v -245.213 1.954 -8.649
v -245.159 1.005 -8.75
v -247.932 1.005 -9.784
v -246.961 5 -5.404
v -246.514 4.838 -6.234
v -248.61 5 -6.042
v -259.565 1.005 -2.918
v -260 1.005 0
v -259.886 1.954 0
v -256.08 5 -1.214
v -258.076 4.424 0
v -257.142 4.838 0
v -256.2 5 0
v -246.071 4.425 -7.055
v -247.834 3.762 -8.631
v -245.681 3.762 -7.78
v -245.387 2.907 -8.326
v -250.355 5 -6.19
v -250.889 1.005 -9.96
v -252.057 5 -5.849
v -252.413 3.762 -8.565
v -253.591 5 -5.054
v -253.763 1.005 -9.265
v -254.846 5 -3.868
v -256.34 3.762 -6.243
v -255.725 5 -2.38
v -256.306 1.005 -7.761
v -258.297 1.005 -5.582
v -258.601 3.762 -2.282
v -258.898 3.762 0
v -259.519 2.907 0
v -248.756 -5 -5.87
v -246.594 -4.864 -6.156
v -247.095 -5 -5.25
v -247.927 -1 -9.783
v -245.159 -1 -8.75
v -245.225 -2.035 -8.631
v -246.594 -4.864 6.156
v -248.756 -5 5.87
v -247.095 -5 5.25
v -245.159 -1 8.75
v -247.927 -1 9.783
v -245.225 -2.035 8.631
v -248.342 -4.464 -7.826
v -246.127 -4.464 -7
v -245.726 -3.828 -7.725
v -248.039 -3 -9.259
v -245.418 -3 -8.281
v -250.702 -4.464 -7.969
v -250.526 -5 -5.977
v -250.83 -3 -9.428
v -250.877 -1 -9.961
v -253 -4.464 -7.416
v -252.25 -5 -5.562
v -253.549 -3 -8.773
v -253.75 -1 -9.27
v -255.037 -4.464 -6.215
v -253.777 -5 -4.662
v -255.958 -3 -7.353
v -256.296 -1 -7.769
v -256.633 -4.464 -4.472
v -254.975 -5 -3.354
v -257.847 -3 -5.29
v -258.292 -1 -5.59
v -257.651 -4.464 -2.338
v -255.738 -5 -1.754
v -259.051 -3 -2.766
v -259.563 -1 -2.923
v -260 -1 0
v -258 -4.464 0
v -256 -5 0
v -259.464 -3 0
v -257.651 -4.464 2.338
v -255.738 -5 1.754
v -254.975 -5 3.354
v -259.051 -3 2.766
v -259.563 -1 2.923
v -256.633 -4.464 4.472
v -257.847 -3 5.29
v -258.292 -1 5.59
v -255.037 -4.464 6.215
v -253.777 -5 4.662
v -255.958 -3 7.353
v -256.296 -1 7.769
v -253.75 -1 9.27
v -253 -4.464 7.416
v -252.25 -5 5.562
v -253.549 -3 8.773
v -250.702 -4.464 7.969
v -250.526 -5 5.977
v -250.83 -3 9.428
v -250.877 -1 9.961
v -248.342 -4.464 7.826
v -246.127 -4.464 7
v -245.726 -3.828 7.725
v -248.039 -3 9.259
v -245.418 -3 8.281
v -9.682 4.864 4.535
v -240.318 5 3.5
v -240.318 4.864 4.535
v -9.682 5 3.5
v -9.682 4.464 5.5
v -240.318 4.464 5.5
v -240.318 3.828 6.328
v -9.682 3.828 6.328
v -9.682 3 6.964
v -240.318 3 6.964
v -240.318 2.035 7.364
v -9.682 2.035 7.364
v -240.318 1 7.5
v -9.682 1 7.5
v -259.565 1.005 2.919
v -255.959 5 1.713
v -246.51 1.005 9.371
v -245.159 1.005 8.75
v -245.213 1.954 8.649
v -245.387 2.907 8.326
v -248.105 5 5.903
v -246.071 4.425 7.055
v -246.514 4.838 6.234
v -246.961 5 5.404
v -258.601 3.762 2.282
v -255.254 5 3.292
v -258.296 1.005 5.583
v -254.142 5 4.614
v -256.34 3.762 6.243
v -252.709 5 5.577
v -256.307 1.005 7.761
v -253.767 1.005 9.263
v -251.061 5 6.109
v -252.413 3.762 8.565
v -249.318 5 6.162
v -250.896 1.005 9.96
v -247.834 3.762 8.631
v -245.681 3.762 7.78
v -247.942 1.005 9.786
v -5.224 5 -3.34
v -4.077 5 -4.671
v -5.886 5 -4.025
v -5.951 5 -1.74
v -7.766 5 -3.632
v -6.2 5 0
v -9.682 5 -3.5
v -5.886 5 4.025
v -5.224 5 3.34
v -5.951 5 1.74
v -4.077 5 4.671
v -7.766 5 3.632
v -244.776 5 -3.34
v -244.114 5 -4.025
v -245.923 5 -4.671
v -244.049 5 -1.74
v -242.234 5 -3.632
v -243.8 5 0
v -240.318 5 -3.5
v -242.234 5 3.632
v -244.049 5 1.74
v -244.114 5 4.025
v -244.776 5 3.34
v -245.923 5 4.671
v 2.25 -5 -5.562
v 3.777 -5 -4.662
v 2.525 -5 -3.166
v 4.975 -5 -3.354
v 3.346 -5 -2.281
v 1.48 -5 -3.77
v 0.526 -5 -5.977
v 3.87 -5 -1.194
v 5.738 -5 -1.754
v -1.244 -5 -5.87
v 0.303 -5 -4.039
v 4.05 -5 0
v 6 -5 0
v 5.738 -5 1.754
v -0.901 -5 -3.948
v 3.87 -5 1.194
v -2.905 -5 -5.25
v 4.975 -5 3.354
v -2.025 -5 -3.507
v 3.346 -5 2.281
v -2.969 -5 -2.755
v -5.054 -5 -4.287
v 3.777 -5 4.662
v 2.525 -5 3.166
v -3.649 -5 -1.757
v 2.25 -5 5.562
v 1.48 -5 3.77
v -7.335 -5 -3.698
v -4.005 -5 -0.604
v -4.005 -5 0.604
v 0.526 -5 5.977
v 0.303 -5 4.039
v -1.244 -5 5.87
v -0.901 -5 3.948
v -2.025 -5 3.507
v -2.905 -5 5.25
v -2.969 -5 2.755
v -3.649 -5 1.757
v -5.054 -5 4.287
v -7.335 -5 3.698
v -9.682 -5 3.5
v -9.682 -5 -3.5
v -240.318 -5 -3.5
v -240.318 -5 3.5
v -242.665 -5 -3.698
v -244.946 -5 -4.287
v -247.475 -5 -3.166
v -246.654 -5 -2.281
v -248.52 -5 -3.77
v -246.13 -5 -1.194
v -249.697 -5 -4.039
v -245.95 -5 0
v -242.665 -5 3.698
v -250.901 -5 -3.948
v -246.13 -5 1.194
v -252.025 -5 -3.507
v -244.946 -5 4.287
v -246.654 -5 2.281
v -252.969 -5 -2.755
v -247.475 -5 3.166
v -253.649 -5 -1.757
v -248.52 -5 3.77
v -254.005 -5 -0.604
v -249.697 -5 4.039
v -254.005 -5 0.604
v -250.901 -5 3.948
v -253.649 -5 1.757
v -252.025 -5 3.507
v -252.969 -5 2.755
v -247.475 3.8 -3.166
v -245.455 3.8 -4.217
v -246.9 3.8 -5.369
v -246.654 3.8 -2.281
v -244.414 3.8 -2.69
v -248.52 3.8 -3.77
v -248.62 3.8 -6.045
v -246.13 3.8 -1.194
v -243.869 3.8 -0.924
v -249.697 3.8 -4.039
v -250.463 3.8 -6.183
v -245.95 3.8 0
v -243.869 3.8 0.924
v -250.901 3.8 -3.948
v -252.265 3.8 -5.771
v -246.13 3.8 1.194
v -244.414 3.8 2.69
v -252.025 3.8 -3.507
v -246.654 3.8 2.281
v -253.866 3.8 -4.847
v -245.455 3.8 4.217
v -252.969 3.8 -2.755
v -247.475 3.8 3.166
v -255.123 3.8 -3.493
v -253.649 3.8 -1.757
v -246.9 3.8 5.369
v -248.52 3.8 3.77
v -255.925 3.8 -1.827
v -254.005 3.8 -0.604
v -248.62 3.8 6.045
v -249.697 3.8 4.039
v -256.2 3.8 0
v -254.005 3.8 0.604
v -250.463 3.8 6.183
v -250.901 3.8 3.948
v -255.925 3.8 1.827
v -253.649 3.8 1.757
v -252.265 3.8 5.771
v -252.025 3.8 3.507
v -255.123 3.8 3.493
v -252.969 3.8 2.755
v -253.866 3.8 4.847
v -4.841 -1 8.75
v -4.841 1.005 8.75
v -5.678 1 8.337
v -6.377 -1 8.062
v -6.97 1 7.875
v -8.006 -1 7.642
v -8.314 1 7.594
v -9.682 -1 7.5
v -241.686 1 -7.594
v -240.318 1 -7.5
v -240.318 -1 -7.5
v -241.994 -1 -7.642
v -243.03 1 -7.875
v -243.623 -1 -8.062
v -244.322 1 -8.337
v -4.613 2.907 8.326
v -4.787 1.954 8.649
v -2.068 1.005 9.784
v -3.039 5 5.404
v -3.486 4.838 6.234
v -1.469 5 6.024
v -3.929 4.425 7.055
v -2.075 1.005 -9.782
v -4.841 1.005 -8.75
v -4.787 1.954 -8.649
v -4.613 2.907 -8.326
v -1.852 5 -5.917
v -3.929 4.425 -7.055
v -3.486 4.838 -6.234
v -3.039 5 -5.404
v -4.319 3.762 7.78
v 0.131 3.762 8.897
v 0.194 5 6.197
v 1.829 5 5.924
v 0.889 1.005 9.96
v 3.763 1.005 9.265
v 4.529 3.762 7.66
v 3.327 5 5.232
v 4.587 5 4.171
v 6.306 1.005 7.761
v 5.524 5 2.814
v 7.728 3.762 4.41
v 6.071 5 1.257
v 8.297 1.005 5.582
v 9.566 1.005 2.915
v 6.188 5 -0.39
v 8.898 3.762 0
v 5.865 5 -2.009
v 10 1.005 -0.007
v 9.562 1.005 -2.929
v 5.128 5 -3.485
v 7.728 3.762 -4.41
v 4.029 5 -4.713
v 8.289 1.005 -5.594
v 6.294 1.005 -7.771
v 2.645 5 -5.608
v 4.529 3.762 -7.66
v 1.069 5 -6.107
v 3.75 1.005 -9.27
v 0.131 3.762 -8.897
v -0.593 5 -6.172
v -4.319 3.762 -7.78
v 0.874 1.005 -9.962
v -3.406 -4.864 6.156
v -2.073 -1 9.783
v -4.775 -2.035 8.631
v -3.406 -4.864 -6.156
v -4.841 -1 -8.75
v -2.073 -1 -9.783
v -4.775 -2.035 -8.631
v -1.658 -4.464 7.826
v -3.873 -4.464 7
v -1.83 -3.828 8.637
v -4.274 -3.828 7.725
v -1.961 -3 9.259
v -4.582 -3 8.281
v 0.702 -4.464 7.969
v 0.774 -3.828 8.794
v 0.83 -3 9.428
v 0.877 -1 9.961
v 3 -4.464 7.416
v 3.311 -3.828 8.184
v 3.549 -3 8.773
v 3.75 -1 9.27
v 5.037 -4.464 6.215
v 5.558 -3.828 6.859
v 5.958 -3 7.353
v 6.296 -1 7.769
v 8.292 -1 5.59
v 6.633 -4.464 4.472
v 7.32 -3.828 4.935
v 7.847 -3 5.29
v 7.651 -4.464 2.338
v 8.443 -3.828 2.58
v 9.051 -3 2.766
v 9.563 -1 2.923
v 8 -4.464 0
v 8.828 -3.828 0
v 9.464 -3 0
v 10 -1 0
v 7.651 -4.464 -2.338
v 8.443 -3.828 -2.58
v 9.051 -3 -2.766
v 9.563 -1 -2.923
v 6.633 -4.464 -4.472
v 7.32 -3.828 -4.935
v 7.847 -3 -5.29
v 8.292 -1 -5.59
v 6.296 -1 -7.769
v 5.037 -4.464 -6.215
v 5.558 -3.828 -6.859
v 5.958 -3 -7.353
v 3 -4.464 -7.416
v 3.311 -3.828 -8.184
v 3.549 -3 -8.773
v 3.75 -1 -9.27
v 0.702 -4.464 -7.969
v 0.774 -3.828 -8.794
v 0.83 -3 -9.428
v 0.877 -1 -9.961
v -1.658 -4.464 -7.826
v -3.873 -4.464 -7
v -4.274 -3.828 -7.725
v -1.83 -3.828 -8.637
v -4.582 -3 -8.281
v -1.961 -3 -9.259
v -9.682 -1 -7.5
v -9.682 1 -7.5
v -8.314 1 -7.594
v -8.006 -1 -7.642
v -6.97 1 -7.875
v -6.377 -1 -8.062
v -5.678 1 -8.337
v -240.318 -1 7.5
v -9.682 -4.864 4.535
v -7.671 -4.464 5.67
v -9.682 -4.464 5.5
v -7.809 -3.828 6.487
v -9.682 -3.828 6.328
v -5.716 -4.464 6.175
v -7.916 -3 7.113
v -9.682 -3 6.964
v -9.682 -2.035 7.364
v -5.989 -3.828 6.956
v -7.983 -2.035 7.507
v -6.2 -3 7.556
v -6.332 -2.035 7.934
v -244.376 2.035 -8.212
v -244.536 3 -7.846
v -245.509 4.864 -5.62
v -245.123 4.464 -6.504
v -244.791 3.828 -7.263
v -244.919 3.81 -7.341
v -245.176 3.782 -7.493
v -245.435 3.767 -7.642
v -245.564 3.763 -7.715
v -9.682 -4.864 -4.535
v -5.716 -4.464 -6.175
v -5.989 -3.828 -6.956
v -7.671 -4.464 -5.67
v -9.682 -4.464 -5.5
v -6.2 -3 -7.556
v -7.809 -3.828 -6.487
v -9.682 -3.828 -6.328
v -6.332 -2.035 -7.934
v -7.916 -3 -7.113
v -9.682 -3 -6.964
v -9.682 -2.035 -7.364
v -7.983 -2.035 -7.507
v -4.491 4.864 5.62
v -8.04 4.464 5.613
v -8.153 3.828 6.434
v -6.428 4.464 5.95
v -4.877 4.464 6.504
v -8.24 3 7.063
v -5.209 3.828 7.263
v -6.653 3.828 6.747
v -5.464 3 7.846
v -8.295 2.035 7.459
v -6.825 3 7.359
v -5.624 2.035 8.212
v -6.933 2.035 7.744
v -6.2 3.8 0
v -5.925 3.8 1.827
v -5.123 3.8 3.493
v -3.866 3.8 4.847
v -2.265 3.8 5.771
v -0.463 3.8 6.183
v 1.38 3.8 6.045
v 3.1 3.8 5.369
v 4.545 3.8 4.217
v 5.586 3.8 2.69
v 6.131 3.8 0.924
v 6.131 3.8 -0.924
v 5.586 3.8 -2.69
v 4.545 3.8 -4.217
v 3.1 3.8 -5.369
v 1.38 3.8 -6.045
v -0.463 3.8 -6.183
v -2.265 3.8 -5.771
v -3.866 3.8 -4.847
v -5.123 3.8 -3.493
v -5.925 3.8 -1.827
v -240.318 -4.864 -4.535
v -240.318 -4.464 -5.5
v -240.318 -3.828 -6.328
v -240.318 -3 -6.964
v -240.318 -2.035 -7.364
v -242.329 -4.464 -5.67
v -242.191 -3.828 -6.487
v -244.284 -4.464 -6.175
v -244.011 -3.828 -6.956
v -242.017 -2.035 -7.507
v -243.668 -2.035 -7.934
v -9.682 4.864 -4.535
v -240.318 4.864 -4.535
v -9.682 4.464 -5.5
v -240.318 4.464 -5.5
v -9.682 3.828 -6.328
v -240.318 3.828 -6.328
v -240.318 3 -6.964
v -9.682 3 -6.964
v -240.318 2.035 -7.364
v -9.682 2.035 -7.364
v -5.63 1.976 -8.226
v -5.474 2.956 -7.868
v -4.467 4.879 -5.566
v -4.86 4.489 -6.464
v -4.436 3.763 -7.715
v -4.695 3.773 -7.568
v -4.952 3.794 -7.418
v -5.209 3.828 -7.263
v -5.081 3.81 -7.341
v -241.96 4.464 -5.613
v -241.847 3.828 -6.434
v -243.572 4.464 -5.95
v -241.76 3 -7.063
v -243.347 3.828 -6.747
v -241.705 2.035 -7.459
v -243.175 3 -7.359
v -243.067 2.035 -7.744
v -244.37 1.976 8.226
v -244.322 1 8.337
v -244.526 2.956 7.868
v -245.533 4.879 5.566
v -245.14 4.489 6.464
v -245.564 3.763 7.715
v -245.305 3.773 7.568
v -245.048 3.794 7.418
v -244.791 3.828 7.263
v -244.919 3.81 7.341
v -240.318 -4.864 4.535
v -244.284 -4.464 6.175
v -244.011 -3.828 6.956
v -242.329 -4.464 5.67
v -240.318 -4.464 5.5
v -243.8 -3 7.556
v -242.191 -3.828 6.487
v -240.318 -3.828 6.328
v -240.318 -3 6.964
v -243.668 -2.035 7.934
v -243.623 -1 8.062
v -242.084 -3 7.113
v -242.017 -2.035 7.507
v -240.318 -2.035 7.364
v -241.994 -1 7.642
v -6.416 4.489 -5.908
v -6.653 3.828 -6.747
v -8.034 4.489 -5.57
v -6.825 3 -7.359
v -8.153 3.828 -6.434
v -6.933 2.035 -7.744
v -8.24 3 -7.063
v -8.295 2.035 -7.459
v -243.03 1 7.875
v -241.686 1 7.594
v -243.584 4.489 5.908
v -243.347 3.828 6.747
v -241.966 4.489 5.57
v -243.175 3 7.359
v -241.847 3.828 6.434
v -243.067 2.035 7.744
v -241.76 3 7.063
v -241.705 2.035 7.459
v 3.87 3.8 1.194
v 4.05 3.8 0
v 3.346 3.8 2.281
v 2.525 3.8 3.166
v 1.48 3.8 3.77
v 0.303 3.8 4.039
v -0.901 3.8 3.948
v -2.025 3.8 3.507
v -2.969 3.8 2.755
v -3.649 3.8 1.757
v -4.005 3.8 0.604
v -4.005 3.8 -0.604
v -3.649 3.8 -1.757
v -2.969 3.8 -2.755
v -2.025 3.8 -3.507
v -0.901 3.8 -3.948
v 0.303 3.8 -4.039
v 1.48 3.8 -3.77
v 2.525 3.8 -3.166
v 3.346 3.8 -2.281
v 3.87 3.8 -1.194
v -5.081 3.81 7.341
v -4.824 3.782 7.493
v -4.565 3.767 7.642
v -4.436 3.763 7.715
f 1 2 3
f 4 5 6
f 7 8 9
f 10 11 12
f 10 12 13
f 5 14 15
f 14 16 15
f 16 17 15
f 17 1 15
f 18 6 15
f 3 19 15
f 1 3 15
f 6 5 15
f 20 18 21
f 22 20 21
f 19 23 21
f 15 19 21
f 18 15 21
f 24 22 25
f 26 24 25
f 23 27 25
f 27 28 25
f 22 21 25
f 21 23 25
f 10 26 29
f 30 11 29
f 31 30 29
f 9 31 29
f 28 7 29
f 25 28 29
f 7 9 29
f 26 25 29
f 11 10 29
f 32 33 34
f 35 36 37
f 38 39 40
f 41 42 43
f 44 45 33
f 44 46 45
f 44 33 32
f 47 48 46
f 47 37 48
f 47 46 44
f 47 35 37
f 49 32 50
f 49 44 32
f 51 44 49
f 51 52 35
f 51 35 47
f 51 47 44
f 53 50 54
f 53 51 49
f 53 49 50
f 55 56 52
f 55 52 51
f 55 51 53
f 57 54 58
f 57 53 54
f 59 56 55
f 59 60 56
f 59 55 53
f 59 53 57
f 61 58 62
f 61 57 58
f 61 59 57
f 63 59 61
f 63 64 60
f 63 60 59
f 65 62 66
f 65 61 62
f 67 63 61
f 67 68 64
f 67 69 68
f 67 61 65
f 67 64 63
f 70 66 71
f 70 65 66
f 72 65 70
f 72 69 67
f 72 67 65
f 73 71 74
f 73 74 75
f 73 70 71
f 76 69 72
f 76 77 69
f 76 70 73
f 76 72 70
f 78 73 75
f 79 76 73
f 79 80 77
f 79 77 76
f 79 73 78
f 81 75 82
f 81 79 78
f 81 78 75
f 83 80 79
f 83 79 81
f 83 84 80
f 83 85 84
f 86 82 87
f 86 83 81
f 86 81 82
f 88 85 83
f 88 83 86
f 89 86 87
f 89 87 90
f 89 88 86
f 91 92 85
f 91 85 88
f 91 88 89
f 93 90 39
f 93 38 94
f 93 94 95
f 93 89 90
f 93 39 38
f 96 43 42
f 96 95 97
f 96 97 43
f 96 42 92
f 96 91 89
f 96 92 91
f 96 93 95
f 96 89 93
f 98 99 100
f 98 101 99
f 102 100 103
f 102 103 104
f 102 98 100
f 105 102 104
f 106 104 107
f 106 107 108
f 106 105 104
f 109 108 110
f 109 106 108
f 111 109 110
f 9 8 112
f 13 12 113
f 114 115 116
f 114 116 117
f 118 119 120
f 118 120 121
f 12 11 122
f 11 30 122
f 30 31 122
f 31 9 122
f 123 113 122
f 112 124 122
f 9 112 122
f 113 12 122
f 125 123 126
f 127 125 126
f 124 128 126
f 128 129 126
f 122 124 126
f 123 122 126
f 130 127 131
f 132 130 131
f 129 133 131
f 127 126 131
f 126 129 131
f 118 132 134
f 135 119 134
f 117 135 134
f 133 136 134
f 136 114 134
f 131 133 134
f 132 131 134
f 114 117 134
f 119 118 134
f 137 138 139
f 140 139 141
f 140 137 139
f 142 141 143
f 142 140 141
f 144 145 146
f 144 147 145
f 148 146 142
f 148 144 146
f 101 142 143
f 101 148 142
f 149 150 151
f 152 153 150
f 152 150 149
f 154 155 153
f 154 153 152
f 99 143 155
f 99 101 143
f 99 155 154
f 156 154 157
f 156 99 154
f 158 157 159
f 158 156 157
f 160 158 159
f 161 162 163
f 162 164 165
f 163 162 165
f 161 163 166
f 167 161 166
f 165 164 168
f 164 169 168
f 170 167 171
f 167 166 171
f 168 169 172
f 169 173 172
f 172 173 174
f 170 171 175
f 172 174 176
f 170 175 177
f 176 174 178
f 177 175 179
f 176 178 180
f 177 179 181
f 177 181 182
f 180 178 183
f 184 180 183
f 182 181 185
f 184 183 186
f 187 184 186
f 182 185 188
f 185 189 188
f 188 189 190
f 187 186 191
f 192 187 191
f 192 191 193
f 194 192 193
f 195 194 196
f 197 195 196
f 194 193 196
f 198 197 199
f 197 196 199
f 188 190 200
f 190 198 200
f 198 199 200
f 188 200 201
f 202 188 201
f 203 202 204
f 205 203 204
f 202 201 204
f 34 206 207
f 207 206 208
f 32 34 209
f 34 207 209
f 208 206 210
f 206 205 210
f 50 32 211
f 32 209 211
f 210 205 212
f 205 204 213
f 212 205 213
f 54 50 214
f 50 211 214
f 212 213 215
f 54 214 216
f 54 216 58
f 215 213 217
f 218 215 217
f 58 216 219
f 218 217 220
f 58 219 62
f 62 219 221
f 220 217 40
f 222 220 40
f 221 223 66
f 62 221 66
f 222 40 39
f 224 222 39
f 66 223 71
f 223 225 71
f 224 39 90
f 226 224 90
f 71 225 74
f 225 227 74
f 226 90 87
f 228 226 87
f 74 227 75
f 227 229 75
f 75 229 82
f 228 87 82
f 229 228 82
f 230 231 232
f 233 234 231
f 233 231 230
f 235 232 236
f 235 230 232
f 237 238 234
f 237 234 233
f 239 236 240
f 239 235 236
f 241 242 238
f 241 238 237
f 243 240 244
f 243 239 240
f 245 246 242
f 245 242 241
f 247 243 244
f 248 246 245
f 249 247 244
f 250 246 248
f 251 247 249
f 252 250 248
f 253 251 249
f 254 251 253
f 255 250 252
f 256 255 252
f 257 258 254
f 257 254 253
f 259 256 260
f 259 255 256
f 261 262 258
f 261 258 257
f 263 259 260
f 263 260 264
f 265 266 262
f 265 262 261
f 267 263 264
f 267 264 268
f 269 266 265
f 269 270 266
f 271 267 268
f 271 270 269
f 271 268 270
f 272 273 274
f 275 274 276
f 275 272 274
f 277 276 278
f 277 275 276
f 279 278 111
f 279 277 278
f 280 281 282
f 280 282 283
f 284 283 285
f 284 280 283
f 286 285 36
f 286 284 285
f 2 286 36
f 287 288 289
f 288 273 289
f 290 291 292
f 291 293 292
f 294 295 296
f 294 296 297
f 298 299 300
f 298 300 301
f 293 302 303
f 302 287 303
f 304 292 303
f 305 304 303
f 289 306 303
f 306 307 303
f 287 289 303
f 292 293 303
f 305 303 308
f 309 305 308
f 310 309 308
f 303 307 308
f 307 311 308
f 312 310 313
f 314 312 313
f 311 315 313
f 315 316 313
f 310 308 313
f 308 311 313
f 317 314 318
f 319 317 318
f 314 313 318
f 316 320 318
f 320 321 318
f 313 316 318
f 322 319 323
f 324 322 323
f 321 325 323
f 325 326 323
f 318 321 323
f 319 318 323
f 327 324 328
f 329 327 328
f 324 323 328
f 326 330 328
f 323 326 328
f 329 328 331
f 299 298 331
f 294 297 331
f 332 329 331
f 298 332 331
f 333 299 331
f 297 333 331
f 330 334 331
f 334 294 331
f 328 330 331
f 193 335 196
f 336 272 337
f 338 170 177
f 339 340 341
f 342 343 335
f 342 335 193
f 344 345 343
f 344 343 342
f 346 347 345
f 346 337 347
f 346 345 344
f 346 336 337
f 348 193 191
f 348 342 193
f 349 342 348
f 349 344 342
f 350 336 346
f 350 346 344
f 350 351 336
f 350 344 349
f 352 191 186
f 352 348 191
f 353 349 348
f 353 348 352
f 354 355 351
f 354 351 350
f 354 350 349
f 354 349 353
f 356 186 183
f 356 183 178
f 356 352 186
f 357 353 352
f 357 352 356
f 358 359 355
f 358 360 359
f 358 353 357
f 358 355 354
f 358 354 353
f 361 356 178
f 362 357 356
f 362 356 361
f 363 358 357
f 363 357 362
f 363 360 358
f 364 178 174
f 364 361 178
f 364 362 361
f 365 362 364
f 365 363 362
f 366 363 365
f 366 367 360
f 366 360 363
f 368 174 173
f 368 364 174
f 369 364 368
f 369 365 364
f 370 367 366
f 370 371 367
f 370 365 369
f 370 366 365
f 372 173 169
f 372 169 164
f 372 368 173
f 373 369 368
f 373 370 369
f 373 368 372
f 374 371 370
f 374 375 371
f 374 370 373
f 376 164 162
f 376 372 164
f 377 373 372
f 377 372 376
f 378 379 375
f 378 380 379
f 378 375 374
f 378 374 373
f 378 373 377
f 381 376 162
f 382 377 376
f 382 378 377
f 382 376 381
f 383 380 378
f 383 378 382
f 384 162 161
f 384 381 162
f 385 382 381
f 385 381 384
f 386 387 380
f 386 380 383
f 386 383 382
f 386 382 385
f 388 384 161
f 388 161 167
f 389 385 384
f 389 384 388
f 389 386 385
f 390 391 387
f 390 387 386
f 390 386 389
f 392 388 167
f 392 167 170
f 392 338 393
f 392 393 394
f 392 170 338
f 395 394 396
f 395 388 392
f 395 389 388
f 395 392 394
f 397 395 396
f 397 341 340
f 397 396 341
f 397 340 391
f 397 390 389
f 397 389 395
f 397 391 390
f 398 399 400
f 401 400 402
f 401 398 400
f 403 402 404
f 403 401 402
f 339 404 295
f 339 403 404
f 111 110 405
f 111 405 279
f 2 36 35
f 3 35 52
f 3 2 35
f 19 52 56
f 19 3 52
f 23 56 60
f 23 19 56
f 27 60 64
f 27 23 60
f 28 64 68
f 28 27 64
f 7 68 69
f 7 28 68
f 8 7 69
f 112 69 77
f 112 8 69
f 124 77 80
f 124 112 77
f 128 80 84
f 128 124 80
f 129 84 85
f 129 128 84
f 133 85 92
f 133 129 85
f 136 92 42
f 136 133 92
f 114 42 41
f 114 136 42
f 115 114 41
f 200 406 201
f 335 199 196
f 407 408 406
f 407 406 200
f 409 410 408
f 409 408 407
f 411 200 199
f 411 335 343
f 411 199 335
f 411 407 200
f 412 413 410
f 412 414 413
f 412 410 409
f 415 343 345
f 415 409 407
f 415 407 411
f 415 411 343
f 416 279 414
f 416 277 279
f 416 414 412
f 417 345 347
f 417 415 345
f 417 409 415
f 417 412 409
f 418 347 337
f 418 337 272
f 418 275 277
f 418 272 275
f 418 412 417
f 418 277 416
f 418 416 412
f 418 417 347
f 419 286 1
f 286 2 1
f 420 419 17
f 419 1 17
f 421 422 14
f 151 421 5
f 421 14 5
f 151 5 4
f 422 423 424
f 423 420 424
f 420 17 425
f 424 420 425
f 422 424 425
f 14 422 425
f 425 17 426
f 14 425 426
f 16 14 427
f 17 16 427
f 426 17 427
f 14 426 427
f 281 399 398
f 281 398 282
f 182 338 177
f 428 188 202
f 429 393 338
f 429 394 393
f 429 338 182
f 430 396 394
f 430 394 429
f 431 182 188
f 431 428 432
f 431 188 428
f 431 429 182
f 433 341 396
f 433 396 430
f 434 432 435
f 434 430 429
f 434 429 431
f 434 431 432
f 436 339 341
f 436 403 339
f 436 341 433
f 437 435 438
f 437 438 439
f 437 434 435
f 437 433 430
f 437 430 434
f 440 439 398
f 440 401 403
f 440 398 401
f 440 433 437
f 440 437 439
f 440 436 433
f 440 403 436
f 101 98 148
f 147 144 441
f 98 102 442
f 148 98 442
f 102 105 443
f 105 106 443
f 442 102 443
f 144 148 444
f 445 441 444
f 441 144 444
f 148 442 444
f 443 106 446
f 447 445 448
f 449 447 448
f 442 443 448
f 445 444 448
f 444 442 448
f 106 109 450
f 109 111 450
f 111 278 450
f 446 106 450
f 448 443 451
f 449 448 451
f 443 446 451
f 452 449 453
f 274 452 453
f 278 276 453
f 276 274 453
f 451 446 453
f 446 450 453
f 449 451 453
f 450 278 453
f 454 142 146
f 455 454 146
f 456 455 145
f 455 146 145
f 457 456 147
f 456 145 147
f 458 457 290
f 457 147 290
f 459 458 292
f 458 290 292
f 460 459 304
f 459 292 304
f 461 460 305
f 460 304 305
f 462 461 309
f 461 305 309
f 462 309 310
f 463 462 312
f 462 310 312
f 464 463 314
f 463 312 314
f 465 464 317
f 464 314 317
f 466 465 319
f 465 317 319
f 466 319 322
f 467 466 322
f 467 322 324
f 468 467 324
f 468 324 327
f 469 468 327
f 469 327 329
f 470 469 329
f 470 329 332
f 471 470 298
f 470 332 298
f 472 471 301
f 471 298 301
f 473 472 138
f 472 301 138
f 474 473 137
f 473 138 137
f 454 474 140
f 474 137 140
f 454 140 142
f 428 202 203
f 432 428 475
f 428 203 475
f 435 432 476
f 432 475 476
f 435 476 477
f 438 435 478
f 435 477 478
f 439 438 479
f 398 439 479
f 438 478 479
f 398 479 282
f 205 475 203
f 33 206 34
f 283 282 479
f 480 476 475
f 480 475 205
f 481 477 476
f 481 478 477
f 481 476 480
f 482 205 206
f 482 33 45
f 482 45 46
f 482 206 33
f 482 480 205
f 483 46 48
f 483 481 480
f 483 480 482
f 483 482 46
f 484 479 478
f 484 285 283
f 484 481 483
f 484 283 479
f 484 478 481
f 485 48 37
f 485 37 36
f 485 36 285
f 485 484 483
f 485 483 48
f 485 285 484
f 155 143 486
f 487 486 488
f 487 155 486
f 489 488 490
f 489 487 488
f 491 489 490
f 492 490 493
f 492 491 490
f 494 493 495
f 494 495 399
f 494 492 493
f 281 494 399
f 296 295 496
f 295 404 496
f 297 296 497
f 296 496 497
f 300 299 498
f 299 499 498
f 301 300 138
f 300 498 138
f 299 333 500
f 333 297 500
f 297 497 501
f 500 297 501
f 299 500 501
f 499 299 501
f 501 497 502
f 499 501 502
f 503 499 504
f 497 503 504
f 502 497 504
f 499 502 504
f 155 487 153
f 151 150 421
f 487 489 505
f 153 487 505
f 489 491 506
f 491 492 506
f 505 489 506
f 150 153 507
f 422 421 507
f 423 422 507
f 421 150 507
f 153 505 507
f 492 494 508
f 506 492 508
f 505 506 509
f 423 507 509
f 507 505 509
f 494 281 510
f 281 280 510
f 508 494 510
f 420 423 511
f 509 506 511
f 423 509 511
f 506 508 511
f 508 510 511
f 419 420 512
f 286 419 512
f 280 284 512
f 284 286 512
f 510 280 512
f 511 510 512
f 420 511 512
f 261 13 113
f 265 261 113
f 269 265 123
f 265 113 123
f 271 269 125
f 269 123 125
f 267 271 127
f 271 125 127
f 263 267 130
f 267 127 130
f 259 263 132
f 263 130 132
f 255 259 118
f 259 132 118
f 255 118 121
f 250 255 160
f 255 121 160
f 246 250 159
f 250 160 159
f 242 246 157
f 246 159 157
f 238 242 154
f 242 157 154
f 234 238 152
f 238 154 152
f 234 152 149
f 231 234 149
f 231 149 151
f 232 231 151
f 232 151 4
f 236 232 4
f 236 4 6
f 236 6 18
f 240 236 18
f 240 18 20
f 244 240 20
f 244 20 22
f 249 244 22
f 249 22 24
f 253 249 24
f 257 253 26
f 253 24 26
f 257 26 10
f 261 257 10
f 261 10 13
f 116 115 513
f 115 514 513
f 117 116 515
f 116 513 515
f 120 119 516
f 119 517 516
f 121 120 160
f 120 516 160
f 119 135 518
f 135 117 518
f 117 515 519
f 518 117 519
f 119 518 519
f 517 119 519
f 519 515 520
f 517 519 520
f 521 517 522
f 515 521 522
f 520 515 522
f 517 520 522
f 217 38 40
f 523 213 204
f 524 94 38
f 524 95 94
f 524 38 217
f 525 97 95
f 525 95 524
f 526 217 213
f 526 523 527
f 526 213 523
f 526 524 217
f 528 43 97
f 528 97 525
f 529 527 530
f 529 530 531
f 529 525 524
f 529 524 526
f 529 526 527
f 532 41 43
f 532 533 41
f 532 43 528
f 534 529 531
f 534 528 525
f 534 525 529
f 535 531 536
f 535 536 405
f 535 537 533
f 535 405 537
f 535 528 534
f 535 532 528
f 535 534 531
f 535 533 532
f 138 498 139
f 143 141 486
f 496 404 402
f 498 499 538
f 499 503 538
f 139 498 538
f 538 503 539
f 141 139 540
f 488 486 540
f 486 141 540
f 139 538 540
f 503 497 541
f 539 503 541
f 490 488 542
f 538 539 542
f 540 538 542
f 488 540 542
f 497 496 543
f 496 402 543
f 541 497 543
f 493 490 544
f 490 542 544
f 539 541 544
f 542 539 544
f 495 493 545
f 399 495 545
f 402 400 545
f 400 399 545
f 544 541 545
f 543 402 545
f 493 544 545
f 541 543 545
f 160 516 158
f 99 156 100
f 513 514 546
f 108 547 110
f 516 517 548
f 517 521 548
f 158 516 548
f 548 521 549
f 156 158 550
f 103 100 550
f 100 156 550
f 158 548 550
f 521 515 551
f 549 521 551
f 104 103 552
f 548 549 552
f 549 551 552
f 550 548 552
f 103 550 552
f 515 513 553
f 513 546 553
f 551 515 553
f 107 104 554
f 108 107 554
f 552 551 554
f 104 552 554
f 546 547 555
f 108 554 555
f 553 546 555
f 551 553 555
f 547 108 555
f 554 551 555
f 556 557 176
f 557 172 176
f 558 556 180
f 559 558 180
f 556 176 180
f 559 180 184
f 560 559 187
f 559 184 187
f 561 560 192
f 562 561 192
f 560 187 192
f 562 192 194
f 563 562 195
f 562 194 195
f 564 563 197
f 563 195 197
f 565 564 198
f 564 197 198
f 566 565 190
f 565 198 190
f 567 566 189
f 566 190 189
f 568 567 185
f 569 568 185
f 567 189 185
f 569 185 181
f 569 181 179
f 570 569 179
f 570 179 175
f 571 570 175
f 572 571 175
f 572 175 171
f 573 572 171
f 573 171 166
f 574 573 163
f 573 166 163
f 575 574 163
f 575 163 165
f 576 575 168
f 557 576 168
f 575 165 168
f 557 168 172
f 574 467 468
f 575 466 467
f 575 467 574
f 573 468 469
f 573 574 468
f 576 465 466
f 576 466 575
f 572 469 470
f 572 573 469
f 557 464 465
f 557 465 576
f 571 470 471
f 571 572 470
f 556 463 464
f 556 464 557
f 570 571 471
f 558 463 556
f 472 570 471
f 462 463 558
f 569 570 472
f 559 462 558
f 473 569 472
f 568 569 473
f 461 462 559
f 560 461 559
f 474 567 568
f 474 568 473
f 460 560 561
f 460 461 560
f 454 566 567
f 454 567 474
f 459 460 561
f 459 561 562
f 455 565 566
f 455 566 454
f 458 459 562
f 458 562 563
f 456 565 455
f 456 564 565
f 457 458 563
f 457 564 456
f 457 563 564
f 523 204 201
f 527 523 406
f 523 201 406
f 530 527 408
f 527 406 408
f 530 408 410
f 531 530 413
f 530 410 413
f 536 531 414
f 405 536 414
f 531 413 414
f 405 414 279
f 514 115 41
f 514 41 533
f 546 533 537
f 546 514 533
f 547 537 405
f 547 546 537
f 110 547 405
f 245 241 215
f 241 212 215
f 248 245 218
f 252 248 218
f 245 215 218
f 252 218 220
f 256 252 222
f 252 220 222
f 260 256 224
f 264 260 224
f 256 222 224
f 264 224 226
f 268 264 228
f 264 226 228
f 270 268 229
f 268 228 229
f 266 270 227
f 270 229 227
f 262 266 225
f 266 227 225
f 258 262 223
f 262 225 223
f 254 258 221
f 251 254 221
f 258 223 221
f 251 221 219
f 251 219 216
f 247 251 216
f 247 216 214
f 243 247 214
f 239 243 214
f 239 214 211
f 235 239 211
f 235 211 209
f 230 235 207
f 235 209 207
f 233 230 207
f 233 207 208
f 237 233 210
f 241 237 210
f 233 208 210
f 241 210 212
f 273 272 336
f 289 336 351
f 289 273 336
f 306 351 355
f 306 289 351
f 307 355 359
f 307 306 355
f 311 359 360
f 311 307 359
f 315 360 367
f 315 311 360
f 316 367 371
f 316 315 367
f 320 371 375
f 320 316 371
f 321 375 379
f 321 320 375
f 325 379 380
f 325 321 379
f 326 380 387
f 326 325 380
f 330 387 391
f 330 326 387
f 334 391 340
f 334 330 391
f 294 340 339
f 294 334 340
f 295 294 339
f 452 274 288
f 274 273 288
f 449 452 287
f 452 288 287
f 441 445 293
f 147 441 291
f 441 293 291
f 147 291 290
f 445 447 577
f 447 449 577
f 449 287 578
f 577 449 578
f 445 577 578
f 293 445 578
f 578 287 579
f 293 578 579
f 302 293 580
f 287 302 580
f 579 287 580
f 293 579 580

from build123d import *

# Parameters (mm, degrees)
SALIENTE_EXTRUIR1_DEPTH                              = 5
REFRENTADO_PARA_TORNILLO_CON_CABEZA_PLAN_D           = 8.1
REFRENTADO_PARA_TORNILLO_CON_CABEZA_PLAN_CBORE_D     = 12.4
REFRENTADO_PARA_TORNILLO_CON_CABEZA_PLAN_CBORE_DEPTH = 1.2
REDONDEO7_R                                          = 10
REDONDEO6_R                                          = 4


with BuildPart() as part:
    # Croquis1 → Saliente-Extruir1 (new, symmetric)
    with BuildSketch(Plane(origin=(0, 0, 0), x_dir=(-1, 0, 0), z_dir=(0, 1, 0))):
        with BuildLine():
            Line((6.614378278, -7.5), (243.385621722, -7.5))
            ThreePointArc((243.385621722, -7.5), (260, 0), (243.385621722, 7.5))
            Line((243.385621722, 7.5), (6.614378278, 7.5))
            ThreePointArc((6.614378278, 7.5), (-10, 0), (6.614378278, -7.5))
        make_face()
    extrude(amount=SALIENTE_EXTRUIR1_DEPTH, both=True)

    # Refrentado para tornillo con cabeza plana de M81 (through all)
    with Locations(Plane(origin=(0, 5, 0), x_dir=(-1, 0, 0), z_dir=(0, 1, 0))):
        with Locations((0, 0), (250, 0)):
            CounterBoreHole(REFRENTADO_PARA_TORNILLO_CON_CABEZA_PLAN_D / 2, REFRENTADO_PARA_TORNILLO_CON_CABEZA_PLAN_CBORE_D / 2, REFRENTADO_PARA_TORNILLO_CON_CABEZA_PLAN_CBORE_DEPTH)

    # Redondeo7
    redondeo7_edges = [part.edges().sort_by_distance(p)[0] for p in [
        (-243.385621722, 0, -7.5),
        (-6.614378278, 0, -7.5),
        (-6.614378278, 0, 7.5),
        (-243.385621722, 0, 7.5),
    ]]
    fillet(redondeo7_edges, radius=REDONDEO7_R)

    # Redondeo6
    redondeo6_edges = [part.edges().sort_by_distance(p)[0] for p in [
        (-260, -5, 0),
        (-125, 5, 7.5),
        (-125, -5, 7.5),
        (-125, 5, -7.5),
        (-125, -5, -7.5),
        (-7.182458366, -5, -7.817541634),
        (-7.182458366, -5, 7.817541634),
        (-242.817541634, -5, 7.817541634),
        (-242.817541634, -5, -7.817541634),
        (-7.182458366, 5, -7.817541634),
        (-7.182458366, 5, 7.817541634),
        (-242.817541634, 5, 7.817541634),
        (-242.817541634, 5, -7.817541634),
        (10, -5, 0),
    ]]
    fillet(redondeo6_edges, radius=REDONDEO6_R)


solid = part.part
